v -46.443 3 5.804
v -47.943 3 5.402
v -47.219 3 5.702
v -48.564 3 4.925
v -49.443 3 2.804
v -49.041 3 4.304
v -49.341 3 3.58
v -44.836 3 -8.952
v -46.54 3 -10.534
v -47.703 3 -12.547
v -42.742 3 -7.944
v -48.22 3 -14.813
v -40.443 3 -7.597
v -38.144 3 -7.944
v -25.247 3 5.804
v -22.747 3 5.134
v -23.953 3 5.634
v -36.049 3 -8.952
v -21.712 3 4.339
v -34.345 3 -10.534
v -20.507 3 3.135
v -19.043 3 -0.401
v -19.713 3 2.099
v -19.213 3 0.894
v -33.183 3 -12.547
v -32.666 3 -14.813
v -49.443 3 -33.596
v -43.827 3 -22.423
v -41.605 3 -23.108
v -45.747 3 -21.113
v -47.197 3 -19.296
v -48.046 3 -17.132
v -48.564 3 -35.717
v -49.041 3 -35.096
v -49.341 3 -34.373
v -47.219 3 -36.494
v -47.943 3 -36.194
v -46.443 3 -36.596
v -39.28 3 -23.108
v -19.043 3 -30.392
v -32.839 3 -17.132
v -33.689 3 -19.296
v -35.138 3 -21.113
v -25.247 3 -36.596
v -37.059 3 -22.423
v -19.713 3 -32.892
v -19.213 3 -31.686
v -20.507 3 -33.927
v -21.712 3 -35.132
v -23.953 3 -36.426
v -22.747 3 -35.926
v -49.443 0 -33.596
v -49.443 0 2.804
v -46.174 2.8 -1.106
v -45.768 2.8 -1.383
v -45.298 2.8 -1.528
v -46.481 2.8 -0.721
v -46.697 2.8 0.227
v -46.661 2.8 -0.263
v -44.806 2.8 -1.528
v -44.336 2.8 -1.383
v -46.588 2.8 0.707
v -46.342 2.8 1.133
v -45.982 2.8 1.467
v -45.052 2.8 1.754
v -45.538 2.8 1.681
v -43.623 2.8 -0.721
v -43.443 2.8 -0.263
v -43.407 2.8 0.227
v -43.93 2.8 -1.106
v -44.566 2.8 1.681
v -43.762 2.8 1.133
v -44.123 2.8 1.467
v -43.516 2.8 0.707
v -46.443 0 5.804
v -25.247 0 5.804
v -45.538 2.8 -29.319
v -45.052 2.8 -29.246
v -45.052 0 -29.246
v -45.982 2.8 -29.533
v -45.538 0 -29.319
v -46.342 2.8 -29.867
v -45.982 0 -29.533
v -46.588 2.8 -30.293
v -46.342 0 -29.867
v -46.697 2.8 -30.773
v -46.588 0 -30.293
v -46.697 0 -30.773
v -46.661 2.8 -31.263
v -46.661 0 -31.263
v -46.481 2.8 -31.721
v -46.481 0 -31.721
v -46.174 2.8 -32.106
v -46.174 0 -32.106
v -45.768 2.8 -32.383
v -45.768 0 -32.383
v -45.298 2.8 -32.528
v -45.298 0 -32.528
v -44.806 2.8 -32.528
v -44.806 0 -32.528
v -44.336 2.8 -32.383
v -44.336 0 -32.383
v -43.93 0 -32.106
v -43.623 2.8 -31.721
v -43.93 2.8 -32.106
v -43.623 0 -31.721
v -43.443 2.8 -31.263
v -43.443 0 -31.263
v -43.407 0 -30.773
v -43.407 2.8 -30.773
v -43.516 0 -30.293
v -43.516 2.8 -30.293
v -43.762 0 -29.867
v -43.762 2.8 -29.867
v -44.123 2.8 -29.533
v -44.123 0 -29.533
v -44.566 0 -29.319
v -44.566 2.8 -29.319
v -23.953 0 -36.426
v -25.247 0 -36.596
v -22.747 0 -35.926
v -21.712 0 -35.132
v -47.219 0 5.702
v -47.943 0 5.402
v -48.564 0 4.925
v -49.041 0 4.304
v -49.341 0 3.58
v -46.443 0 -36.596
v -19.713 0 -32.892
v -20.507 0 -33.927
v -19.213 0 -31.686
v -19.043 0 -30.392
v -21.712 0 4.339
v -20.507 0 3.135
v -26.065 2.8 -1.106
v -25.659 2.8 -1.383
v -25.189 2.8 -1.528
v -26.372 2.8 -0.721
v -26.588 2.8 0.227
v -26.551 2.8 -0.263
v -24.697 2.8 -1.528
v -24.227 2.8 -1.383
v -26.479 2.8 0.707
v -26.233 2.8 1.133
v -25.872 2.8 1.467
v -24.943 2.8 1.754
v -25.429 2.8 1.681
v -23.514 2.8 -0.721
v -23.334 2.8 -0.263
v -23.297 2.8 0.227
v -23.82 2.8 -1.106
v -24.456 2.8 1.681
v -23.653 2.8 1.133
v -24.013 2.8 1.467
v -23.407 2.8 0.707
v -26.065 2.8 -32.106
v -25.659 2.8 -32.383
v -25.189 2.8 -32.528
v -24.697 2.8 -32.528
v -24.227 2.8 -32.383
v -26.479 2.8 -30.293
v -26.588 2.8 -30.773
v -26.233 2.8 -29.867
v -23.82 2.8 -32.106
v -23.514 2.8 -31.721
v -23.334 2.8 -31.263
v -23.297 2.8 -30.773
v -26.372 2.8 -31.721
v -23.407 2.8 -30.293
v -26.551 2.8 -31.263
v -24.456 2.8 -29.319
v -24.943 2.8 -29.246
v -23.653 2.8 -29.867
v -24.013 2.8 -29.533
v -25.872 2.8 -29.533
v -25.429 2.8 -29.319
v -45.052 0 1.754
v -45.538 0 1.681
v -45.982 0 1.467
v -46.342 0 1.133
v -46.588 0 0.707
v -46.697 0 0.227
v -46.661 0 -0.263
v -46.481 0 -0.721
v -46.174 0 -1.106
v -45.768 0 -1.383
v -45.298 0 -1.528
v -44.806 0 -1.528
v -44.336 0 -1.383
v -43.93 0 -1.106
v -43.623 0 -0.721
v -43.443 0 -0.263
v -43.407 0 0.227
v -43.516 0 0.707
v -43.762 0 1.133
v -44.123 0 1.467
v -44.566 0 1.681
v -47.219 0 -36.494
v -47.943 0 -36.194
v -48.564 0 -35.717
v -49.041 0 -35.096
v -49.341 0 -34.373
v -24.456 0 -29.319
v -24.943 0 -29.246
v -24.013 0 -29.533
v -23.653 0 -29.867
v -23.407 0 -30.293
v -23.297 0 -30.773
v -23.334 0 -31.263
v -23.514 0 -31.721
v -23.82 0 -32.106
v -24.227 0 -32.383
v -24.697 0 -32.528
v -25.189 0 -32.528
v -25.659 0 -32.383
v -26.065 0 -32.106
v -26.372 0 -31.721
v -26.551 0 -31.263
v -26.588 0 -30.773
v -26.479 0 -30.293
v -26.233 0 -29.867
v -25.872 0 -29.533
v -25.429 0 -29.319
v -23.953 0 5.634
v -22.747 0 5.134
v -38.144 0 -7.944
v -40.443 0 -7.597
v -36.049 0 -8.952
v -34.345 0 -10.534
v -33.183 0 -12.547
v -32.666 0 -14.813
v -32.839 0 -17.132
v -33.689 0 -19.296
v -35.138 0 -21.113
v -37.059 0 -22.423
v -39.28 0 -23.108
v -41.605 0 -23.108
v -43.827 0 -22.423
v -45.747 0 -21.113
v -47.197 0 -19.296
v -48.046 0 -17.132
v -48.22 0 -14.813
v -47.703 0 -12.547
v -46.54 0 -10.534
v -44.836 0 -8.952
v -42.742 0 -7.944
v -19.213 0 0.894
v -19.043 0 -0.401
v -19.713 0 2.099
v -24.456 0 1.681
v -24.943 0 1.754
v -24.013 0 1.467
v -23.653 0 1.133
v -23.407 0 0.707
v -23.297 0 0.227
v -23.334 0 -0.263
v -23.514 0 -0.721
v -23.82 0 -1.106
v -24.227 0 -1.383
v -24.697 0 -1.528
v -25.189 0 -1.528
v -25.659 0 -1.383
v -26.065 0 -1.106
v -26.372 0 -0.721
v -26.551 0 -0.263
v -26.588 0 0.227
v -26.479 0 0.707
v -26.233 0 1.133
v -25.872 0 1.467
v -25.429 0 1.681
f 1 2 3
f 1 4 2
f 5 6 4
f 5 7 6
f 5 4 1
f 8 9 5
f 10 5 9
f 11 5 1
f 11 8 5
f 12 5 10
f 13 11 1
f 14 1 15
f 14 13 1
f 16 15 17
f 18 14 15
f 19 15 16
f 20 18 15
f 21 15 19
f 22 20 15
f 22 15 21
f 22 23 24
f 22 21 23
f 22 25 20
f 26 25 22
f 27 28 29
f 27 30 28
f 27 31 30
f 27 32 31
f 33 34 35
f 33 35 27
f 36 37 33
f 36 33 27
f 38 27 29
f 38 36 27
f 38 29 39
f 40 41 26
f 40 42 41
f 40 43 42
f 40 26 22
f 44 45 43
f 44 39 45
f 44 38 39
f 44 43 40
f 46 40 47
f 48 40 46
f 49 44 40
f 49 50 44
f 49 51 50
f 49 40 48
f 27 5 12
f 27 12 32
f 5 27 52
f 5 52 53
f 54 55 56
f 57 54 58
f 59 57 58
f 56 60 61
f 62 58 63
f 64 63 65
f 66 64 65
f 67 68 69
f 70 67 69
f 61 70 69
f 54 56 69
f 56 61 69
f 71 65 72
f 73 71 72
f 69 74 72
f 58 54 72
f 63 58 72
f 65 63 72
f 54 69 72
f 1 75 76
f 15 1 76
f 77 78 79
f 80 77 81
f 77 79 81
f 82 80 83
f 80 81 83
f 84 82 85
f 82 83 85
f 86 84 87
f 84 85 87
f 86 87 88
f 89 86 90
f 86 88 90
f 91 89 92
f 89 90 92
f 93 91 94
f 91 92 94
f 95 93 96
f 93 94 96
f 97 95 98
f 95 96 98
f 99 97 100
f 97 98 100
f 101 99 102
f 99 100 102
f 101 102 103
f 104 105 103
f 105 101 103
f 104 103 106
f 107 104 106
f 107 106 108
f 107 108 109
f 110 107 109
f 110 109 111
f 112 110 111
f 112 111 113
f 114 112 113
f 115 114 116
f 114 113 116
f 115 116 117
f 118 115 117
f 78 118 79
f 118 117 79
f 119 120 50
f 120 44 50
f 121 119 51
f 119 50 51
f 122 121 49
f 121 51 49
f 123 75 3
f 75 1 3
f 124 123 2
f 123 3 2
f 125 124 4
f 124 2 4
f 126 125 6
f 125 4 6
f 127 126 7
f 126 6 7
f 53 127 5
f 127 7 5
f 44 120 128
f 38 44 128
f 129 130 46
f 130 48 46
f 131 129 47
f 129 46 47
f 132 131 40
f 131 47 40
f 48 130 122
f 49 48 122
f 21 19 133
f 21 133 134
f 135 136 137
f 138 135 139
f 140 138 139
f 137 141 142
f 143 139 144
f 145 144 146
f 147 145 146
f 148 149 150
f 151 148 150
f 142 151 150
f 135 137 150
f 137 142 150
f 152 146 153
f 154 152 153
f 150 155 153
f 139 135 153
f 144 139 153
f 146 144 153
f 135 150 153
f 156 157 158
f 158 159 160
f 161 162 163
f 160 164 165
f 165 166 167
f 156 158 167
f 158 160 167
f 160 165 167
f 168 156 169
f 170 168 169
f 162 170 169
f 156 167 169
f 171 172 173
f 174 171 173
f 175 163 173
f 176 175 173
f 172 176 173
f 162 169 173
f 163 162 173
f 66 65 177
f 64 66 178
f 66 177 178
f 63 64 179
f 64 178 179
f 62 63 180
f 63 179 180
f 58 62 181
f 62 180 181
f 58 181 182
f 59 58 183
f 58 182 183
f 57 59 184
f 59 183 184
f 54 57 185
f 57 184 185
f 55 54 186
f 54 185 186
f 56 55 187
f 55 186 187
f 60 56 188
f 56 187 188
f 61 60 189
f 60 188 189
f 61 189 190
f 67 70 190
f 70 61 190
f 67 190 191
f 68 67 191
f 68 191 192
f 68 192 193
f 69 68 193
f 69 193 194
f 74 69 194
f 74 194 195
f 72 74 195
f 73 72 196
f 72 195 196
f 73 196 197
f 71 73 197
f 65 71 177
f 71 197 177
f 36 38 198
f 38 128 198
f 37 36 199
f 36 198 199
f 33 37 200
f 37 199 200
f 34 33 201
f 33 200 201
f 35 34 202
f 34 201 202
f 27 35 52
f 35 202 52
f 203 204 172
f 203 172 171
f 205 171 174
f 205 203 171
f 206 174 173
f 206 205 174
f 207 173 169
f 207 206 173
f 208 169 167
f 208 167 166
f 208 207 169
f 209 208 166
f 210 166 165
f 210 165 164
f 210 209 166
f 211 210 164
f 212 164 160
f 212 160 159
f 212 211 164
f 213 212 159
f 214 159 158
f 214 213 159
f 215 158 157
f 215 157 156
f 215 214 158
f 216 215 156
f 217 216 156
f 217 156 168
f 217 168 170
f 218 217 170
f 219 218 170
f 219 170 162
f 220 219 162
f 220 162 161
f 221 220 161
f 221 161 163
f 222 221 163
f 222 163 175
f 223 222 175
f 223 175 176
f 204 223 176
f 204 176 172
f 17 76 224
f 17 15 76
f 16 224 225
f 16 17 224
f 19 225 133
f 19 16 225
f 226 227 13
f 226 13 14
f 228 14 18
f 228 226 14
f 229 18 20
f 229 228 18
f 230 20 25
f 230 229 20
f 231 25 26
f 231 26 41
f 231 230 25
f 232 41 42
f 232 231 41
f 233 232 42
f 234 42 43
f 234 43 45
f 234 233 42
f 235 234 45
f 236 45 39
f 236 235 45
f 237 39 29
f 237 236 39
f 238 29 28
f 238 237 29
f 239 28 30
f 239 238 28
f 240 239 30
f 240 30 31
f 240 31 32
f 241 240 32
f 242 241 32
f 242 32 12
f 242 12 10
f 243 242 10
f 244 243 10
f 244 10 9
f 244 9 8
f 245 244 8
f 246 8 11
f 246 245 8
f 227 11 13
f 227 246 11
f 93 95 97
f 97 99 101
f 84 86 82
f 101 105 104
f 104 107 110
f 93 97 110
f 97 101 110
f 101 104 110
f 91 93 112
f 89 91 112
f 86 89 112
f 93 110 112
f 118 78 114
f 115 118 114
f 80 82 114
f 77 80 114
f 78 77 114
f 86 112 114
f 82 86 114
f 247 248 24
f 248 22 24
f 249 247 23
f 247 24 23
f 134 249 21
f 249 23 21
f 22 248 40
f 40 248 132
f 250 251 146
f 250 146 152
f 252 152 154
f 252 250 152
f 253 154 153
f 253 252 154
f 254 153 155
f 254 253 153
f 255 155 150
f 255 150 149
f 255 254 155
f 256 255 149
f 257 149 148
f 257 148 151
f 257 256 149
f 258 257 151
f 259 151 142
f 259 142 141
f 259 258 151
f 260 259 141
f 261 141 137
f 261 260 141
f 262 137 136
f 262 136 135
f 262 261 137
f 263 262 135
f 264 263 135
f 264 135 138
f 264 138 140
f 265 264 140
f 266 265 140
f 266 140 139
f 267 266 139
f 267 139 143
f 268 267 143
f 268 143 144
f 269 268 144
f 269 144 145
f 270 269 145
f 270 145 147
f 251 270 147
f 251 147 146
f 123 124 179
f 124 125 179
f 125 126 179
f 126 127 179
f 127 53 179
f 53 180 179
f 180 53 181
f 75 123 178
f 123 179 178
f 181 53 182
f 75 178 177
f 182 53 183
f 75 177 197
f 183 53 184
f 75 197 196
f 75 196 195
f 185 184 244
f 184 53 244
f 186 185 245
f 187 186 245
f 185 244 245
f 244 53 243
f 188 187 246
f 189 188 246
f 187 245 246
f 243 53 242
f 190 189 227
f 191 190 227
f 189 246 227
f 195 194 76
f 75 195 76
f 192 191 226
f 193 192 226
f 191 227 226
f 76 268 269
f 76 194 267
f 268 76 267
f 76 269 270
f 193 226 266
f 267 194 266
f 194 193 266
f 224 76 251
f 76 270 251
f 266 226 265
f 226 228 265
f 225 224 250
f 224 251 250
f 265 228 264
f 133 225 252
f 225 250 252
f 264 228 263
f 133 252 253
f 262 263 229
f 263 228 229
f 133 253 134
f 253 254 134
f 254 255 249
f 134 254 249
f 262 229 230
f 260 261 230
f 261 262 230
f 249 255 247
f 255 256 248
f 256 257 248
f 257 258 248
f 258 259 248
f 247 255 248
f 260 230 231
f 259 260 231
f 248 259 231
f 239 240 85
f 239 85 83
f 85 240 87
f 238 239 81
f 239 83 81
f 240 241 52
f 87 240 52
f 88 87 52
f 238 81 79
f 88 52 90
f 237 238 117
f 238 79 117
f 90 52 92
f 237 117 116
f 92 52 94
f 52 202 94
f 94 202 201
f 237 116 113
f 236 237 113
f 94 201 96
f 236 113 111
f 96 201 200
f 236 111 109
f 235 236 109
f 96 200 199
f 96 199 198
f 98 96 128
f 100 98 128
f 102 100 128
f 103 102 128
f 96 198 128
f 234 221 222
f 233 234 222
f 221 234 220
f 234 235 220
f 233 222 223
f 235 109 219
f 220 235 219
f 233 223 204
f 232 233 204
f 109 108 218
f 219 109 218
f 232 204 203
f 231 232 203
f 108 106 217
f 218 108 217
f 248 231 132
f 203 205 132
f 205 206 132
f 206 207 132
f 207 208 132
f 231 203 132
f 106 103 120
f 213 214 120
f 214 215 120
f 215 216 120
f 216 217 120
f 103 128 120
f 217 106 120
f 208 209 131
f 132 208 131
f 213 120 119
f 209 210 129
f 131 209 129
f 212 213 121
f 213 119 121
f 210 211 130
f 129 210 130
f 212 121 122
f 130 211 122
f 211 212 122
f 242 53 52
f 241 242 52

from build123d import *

# Parameters (mm, degrees)
SZKIC1_R                        = 1.65
SZKIC1_R_2                      = 7.798887489
DODANIE_WYCI_GNI_CIE1_DEPTH     = 3
ZAOKR_GLENIE1_R                 = 5
WYTNIJ_WYCI_GNI_CIE1_DEPTH      = 72.750306382
WYTNIJ_WYCI_GNI_CIE1_DEPTH_BACK = 72.750306382
SZKIC2_W                        = 22.67550991
SZKIC2_H                        = 46.936854919
ZAOKR_GLENIE5_R                 = 3
SZKIC3_R                        = 1.65
WYTNIJ_WYCI_GNI_CIE2_DEPTH      = 62.58622378
DODANIE_WYCI_GNI_CIE2_START     = -0.2
SZKIC4_R                        = 1.65
DODANIE_WYCI_GNI_CIE2_DEPTH     = 0.2


with BuildPart() as part:
    # Szkic1 → Dodanie-wyciągnięcie1 (new body)
    with BuildSketch(Plane(origin=(0, 0, 0), x_dir=(1, 0, 0), z_dir=(0, 1, 0))):
        with BuildLine():
            ThreePointArc((-57.522805166, 36.596117071), (-60.573917858, 31.893472489), (-61.642766658, 26.390589884))
            Line((-61.642766658, 26.390589884), (-61.642766658, 4.401644259))
            ThreePointArc((-61.642766658, 4.401644259), (-60.573917858, -1.101238346), (-57.522805166, -5.803882929))
            Line((-57.522805166, -5.803882929), (-23.176157761, -5.803882929))
            Line((-23.176157761, -5.803882929), (-19.042766658, -1.670491825))
            Line((-19.042766658, -1.670491825), (-19.042766658, 32.462725968))
            Line((-19.042766658, 32.462725968), (-23.176157761, 36.596117071))
            Line((-23.176157761, 36.596117071), (-57.522805166, 36.596117071))
        make_face()
        with Locations(Location((-55.942766658, -0.103882929, 0), (0, 0, 270))):
            Circle(SZKIC1_R, mode=Mode.SUBTRACT)
        with Locations(Location((-24.942766658, -0.103882929, 0), (0, 0, 270))):
            Circle(SZKIC1_R, mode=Mode.SUBTRACT)
        with Locations(Location((-55.942766658, 30.896117071, 0), (0, 0, 270))):
            Circle(SZKIC1_R, mode=Mode.SUBTRACT)
        with Locations(Location((-24.942766658, 30.896117071, 0), (0, 0, 270))):
            Circle(SZKIC1_R, mode=Mode.SUBTRACT)
        with Locations(Location((-40.442766658, 15.396117071, 0), (0, 0, 270))):
            Circle(SZKIC1_R_2, mode=Mode.SUBTRACT)
    extrude(amount=DODANIE_WYCI_GNI_CIE1_DEPTH)

    # Zaokrąglenie1
    zaokr_glenie1_edges = [part.edges().sort_by_distance(p)[0] for p in [
        (-23.176157761, 1.5, -36.596117071),
        (-19.042766658, 1.5, -32.462725968),
        (-19.042766658, 1.5, 1.670491825),
        (-23.176157761, 1.5, 5.803882929),
        (-57.522805166, 1.5, 5.803882929),
        (-57.522805166, 1.5, -36.596117071),
    ]]
    fillet(zaokr_glenie1_edges, radius=ZAOKR_GLENIE1_R)

    # Szkic2 → Wytnij-wyciągnięcie1 (cut, two sides: drawn at the far end of the back side and taken through both)
    with BuildSketch(Plane.XZ.offset(-WYTNIJ_WYCI_GNI_CIE1_DEPTH_BACK)):
        with Locations((-60.780521613, -15.396117072)):
            Rectangle(SZKIC2_W, SZKIC2_H)
    extrude(amount=WYTNIJ_WYCI_GNI_CIE1_DEPTH + WYTNIJ_WYCI_GNI_CIE1_DEPTH_BACK, mode=Mode.SUBTRACT)

    # Zaokrąglenie5
    zaokr_glenie5_edges = [part.edges().sort_by_distance(p)[0] for p in [
        (-49.442766658, 1.5, -36.596117071),
        (-49.442766658, 1.5, 5.803882929),
    ]]
    fillet(zaokr_glenie5_edges, radius=ZAOKR_GLENIE5_R)

    # Szkic3 → Wytnij-wyciągnięcie2 (cut, through all)
    with BuildSketch(Plane.XZ):
        with Locations(Location((-45.052026831, -30.896117071, 0), (0, 0, 90))):
            Circle(SZKIC3_R)
        with Locations(Location((-45.052026831, 0.103882929, 0), (0, 0, 90))):
            Circle(SZKIC3_R)
    extrude(amount=-WYTNIJ_WYCI_GNI_CIE2_DEPTH, mode=Mode.SUBTRACT)

    # Szkic4 → Dodanie-wyciągnięcie2 (add)
    with BuildSketch(Plane(origin=(0, 3, 0), x_dir=(1, 0, 0), z_dir=(0, 1, 0)).offset(DODANIE_WYCI_GNI_CIE2_START)):
        with Locations(Location((-45.052026831, 30.896117071, 0), (0, 0, 270))):
            Circle(SZKIC4_R)
        with Locations(Location((-24.942766658, 30.896117071, 0), (0, 0, 270))):
            Circle(SZKIC4_R)
        with Locations(Location((-24.942766658, -0.103882929, 0), (0, 0, 270))):
            Circle(SZKIC4_R)
        with Locations(Location((-45.052026831, -0.103882929, 0), (0, 0, 270))):
            Circle(SZKIC4_R)
    extrude(amount=DODANIE_WYCI_GNI_CIE2_DEPTH)


solid = part.part
